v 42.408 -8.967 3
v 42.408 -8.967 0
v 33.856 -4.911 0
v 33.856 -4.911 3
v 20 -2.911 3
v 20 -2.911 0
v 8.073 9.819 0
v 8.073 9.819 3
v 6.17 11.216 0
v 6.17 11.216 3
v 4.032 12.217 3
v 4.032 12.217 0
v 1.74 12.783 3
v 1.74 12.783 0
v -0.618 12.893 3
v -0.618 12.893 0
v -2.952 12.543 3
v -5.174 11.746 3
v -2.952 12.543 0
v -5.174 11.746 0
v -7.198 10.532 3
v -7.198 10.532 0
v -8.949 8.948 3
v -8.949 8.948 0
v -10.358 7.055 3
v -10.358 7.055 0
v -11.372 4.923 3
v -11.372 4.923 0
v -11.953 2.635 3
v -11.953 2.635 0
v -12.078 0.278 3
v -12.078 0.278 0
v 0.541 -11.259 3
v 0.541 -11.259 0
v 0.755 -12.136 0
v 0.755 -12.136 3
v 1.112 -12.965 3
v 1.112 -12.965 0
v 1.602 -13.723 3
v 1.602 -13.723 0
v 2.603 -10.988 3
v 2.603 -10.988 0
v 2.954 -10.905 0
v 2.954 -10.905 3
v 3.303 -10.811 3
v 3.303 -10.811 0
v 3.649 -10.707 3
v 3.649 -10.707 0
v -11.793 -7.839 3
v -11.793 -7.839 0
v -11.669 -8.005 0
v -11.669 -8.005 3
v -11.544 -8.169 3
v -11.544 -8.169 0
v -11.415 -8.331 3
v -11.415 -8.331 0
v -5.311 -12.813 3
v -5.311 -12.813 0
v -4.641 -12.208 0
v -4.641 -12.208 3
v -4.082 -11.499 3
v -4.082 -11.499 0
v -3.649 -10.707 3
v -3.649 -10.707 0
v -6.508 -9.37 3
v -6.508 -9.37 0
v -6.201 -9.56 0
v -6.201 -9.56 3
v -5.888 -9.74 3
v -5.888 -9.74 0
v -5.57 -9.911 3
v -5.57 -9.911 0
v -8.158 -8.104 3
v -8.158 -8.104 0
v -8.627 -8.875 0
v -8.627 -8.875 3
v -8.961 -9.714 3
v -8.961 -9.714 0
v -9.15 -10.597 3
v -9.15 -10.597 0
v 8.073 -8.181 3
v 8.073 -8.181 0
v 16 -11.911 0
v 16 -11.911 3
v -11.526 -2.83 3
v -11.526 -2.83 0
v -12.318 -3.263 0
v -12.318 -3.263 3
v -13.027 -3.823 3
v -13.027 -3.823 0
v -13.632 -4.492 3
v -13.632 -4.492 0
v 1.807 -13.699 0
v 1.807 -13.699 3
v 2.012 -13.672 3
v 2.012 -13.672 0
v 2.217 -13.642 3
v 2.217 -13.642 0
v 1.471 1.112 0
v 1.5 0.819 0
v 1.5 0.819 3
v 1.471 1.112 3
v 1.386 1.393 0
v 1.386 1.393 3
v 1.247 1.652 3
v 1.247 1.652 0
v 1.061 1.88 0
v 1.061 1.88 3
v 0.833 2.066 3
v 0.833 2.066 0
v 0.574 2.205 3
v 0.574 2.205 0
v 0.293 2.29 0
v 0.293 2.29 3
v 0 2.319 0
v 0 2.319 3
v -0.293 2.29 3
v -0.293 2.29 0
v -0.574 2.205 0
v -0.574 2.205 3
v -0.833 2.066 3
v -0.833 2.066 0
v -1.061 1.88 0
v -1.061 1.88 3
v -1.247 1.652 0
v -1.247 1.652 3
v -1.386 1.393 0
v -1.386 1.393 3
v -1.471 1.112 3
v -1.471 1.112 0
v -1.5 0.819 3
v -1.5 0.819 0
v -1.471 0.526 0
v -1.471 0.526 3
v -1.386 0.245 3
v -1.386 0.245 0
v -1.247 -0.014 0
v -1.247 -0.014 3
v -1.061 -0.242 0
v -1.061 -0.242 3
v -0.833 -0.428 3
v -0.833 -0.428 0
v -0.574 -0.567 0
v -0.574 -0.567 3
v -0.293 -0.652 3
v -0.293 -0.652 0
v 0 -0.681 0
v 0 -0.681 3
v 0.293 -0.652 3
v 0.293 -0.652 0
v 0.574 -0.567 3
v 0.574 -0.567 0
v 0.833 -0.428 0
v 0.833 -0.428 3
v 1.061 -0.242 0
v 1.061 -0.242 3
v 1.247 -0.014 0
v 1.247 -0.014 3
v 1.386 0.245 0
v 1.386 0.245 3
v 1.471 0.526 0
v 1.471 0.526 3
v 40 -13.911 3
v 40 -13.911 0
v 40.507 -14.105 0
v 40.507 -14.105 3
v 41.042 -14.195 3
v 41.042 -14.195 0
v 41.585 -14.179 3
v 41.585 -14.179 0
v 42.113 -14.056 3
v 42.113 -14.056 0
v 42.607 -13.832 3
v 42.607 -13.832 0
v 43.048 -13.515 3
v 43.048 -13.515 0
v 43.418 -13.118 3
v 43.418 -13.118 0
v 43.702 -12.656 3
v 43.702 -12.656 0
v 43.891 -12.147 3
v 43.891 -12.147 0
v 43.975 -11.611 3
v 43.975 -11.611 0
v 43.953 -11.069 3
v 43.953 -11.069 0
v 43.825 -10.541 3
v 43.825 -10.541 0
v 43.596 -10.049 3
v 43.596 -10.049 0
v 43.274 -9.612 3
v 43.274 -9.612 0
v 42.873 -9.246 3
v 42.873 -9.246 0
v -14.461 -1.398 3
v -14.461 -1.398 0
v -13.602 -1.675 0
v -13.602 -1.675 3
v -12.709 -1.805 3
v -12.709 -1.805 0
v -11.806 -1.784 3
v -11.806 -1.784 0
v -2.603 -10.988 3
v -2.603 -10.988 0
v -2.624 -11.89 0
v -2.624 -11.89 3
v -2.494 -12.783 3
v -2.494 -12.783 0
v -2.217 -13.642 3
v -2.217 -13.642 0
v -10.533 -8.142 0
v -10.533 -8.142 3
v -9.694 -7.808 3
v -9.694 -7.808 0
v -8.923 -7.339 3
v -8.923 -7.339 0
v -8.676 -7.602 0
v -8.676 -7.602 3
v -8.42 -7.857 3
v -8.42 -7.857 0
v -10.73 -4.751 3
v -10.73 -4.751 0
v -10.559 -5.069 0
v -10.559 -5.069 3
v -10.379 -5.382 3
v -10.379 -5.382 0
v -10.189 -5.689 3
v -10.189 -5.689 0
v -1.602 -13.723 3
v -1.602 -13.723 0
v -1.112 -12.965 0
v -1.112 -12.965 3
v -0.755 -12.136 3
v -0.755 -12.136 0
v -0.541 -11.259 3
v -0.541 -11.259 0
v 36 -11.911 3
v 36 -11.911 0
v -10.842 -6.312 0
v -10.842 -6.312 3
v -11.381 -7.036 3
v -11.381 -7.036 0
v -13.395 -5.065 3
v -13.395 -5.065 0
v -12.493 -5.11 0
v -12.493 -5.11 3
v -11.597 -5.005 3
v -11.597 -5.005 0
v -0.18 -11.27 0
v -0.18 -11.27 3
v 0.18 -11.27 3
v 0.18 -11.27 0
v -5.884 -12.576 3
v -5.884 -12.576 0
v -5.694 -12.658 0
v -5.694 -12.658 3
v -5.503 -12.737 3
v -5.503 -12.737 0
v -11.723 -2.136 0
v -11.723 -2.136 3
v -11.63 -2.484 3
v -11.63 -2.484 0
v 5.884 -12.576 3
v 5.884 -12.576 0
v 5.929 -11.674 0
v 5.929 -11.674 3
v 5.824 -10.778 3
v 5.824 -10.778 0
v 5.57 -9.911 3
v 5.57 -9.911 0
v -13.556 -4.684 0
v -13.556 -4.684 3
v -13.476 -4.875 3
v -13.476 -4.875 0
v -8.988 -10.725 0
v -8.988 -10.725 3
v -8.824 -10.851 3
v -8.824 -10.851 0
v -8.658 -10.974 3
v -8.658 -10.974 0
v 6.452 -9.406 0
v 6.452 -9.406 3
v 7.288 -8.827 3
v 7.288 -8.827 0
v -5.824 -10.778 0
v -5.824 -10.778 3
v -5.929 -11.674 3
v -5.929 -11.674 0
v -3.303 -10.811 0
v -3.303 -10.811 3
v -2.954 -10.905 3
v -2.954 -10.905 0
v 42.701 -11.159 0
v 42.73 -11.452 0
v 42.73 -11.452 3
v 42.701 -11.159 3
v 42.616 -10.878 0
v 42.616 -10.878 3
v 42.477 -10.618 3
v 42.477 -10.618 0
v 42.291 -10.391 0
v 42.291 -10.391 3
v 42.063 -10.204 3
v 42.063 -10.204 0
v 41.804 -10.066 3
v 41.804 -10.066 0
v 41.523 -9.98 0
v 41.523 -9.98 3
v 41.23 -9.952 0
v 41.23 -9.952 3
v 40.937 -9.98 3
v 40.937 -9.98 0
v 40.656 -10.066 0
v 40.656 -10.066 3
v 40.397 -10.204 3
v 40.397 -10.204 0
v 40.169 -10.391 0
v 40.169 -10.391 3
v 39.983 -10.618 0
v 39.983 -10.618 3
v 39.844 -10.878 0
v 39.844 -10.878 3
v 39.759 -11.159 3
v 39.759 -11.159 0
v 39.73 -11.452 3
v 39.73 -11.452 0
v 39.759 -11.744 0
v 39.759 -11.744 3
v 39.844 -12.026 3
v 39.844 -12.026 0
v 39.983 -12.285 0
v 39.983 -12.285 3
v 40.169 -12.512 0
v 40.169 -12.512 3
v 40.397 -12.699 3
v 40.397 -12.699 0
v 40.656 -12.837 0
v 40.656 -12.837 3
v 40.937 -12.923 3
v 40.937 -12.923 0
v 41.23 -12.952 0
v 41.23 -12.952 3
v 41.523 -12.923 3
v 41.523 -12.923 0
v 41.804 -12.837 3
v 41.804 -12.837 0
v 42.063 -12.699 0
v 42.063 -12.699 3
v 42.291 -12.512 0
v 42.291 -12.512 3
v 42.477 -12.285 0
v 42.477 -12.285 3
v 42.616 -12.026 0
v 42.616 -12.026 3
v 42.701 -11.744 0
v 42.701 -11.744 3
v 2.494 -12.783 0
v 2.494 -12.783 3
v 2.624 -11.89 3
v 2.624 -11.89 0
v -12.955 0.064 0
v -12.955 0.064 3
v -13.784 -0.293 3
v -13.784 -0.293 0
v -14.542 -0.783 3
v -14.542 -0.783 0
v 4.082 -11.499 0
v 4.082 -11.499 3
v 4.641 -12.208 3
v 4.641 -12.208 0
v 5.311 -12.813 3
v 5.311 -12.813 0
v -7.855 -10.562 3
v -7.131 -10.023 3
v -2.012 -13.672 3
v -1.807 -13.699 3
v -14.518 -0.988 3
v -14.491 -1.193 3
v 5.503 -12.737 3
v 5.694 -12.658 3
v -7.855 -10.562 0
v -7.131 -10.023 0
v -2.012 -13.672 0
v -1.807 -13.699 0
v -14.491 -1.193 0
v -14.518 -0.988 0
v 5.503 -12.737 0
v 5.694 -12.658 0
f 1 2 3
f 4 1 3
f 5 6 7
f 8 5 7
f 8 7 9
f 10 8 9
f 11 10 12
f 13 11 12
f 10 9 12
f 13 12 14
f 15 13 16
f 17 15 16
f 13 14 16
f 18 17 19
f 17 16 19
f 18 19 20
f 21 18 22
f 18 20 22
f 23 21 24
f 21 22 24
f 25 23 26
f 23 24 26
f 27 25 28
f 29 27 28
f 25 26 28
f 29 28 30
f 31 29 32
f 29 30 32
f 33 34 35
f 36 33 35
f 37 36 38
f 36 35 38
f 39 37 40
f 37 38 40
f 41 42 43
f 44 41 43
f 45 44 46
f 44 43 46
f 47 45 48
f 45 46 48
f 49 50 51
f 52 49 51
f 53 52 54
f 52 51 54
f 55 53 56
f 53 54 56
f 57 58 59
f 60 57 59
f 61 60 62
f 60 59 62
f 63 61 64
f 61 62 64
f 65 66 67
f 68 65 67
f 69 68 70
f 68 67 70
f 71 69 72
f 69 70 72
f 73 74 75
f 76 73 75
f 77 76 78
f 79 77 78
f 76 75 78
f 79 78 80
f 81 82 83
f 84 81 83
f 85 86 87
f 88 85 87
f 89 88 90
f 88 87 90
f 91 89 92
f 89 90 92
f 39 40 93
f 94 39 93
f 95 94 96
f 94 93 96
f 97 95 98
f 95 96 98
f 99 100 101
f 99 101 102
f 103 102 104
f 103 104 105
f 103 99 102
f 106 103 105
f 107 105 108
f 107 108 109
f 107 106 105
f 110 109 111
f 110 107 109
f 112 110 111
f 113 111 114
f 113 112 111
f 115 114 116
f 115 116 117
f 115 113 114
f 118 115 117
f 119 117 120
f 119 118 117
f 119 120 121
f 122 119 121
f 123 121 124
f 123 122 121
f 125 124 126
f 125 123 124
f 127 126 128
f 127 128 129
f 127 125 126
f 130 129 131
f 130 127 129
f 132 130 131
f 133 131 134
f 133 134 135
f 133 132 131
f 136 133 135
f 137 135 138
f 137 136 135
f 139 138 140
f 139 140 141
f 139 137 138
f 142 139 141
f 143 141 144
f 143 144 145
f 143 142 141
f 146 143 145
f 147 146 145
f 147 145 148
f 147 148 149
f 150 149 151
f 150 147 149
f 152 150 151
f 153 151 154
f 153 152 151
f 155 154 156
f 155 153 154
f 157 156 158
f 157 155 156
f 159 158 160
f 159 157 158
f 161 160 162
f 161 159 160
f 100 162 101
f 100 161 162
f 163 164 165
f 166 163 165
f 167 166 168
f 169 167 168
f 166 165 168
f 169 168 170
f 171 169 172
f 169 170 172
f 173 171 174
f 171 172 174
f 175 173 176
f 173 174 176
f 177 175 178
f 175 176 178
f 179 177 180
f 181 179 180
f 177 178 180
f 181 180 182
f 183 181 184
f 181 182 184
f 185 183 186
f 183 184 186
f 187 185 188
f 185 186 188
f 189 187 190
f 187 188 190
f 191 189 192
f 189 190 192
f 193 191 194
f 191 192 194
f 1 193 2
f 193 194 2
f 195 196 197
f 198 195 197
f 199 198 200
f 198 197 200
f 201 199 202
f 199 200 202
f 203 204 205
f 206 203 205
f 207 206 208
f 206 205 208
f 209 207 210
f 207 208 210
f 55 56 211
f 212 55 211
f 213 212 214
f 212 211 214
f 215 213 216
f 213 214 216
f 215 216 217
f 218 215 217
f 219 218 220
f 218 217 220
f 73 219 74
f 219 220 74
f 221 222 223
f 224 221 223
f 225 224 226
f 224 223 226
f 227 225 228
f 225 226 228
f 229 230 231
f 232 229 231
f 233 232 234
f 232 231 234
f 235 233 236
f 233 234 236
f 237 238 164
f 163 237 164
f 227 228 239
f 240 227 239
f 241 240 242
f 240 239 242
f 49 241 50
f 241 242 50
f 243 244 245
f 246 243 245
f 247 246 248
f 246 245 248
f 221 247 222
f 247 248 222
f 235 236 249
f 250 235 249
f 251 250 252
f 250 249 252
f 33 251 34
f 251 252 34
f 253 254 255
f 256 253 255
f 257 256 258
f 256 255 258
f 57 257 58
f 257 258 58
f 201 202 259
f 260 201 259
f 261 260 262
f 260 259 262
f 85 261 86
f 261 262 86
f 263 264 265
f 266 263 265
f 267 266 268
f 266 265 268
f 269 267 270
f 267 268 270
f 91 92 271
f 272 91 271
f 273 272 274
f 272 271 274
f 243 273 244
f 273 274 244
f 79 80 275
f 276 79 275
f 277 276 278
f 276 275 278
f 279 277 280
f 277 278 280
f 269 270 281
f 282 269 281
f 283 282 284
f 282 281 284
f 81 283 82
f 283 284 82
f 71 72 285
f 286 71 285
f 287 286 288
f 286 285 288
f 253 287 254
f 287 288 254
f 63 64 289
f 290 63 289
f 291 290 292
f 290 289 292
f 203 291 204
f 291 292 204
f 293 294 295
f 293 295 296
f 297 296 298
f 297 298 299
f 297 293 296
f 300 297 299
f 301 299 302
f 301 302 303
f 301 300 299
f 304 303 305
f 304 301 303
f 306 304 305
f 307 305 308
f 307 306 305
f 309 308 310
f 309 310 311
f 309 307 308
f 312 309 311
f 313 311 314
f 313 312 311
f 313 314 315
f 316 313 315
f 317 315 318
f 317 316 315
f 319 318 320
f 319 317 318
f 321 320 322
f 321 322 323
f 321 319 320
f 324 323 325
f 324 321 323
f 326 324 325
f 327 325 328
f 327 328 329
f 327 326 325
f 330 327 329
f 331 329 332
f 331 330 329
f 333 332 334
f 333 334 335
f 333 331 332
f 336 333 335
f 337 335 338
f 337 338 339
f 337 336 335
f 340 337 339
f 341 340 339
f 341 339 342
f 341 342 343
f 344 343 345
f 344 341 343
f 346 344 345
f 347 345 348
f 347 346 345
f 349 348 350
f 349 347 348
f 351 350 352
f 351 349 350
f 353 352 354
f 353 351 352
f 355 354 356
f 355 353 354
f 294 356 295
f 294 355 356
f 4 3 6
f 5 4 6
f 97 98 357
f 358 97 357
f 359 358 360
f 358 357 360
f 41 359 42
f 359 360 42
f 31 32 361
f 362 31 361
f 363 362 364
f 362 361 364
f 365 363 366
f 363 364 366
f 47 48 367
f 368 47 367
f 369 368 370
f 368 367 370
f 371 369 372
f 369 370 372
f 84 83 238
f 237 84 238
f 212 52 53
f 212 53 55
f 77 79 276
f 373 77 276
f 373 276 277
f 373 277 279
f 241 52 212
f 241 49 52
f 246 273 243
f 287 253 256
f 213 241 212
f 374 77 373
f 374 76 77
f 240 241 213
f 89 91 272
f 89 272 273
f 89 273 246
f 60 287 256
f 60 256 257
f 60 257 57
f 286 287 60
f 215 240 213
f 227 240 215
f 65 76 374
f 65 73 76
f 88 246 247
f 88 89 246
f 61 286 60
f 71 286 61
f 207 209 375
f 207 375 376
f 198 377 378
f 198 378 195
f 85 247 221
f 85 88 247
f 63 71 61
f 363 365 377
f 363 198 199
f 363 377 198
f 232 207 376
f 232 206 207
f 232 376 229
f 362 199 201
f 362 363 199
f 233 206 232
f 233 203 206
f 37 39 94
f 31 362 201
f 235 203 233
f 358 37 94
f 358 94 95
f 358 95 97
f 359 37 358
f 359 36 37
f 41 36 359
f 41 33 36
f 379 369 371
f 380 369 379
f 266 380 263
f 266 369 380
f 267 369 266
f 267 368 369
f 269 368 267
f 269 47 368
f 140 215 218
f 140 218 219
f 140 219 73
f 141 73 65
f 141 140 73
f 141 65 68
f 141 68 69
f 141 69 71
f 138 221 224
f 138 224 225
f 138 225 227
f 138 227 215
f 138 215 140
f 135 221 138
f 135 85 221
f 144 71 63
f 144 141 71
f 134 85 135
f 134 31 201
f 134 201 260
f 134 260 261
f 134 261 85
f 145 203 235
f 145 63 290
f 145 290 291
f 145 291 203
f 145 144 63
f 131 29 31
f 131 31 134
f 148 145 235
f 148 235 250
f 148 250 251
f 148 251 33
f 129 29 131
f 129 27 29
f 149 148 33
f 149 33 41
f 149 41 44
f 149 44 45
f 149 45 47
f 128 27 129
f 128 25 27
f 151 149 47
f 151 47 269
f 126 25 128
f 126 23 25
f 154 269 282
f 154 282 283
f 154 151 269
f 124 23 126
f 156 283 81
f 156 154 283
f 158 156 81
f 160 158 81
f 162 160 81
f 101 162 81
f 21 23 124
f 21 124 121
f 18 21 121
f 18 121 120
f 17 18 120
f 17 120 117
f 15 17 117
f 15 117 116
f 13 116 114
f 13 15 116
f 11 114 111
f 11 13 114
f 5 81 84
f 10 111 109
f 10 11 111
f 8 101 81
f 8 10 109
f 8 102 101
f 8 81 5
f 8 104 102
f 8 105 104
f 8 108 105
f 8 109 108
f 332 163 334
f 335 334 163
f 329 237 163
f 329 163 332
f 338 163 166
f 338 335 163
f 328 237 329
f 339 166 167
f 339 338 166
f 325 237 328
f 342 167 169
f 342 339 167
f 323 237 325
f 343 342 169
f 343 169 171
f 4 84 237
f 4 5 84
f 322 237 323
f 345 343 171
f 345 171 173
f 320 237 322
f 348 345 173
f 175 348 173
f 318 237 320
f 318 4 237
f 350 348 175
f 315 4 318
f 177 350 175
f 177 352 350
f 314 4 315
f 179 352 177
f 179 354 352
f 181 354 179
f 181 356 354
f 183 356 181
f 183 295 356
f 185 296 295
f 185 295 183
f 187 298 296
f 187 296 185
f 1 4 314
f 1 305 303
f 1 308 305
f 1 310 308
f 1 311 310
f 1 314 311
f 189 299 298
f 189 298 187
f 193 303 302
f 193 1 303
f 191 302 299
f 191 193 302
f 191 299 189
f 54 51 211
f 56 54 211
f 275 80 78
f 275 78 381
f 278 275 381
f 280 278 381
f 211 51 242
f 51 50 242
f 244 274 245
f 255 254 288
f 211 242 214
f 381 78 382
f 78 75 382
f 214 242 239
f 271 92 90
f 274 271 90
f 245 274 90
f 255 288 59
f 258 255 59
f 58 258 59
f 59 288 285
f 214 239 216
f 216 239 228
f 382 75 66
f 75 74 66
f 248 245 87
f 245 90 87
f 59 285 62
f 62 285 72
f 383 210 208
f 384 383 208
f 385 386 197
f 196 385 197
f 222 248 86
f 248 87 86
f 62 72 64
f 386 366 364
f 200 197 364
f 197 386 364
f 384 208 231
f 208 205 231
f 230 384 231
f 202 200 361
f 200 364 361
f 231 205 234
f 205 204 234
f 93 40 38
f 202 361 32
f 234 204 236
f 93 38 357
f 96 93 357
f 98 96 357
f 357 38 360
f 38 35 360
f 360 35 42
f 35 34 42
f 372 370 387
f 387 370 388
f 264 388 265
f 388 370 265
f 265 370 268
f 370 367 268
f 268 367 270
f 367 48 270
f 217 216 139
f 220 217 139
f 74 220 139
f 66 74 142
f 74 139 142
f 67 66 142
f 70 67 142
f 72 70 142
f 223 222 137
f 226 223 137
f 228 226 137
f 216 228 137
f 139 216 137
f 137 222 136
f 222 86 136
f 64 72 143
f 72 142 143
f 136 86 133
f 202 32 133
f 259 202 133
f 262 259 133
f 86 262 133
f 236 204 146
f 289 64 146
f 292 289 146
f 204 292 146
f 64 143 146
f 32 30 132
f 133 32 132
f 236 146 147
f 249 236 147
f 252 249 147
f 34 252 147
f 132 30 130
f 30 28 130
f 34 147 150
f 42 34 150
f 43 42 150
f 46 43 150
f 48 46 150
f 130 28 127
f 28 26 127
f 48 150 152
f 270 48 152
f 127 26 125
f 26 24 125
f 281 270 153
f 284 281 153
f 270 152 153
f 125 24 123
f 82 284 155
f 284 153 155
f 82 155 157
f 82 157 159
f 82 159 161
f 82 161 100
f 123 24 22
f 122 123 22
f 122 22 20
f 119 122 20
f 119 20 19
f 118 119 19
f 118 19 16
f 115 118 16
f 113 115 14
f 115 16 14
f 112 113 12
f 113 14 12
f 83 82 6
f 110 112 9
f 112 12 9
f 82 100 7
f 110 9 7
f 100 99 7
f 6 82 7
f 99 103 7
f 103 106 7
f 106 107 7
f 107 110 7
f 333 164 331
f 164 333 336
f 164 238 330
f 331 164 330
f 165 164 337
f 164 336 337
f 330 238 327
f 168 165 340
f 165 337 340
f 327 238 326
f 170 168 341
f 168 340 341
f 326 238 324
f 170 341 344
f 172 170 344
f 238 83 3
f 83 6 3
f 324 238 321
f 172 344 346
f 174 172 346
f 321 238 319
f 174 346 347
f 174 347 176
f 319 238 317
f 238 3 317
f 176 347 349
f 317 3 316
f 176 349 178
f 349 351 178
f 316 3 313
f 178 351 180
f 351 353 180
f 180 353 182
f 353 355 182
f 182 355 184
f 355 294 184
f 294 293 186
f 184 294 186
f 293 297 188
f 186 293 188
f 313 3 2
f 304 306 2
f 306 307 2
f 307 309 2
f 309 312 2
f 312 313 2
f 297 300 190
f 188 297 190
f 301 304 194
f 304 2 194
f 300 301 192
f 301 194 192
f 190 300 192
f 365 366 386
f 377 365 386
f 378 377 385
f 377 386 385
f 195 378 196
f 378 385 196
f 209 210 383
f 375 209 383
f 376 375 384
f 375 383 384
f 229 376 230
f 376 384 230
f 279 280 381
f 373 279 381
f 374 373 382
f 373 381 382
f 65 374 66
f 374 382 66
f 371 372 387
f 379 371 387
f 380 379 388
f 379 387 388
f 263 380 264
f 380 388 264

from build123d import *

# Parameters (mm, degrees)
SKETCH2_R           = 1.5
BOSS_EXTRUDE2_DEPTH = 3


with BuildPart() as part:
    # Sketch2 → Boss-Extrude2 (new body)
    with BuildSketch(Plane.XY):
        with BuildLine():
            Line((33.856406461, -4.911436862), (20, -2.911436862))
            Line((20, -2.911436862), (8.072676136, 9.818872958))
            ThreePointArc((8.072676136, 9.818872958), (-5.173839679, 11.745880003), (-12.077884766, 0.277763382))
            ThreePointArc((-12.077884766, 0.277763382), (-13.37688471, -0.097129684), (-14.542044827, -0.782948586))
            ThreePointArc((-14.542044827, -0.782948586), (-14.504838322, -1.090725234), (-14.461118588, -1.3976444))
            ThreePointArc((-14.461118588, -1.3976444), (-13.158157346, -1.758528961), (-11.806390286, -1.78444193))
            ThreePointArc((-11.806390286, -1.78444193), (-11.67804324, -2.310249297), (-11.526291359, -2.829785359))
            ThreePointArc((-11.526291359, -2.829785359), (-12.683999488, -3.528110178), (-13.631954743, -4.492125996))
            ThreePointArc((-13.631954743, -4.492125996), (-13.516357561, -4.779785658), (-13.394691015, -5.064931306))
            ThreePointArc((-13.394691015, -5.064931306), (-12.042723303, -5.076287839), (-10.73030982, -4.751454786))
            ThreePointArc((-10.73030982, -4.751454786), (-10.470247132, -5.226127042), (-10.189200244, -5.688684064))
            ThreePointArc((-10.189200244, -5.688684064), (-11.126720661, -6.662850955), (-11.792869471, -7.839367605))
            ThreePointArc((-11.792869471, -7.839367605), (-11.606759368, -8.087306749), (-11.415437385, -8.331246676))
            ThreePointArc((-11.415437385, -8.331246676), (-10.106597569, -7.992301252), (-8.922976471, -7.338859012))
            ThreePointArc((-8.922976471, -7.338859012), (-8.548920985, -7.730048027), (-8.15773197, -8.104103513))
            ThreePointArc((-8.15773197, -8.104103513), (-8.81117421, -9.287724611), (-9.150119633, -10.596564427))
            ThreePointArc((-9.150119633, -10.596564427), (-8.906179706, -10.787886411), (-8.658240563, -10.973996513))
            ThreePointArc((-8.658240563, -10.973996513), (-7.481723913, -10.307847704), (-6.507557022, -9.370327286))
            ThreePointArc((-6.507557022, -9.370327286), (-6.045, -9.651374174), (-5.570327744, -9.911436862))
            ThreePointArc((-5.570327744, -9.911436862), (-5.895160797, -11.223850345), (-5.883804264, -12.575818057))
            ThreePointArc((-5.883804264, -12.575818057), (-5.598658616, -12.697484603), (-5.310998954, -12.813081785))
            ThreePointArc((-5.310998954, -12.813081785), (-4.346983136, -11.86512653), (-3.648658316, -10.707418401))
            ThreePointArc((-3.648658316, -10.707418401), (-3.129122255, -10.859170282), (-2.603314888, -10.987517329))
            ThreePointArc((-2.603314888, -10.987517329), (-2.577401919, -12.339284388), (-2.216517358, -13.64224563))
            ThreePointArc((-2.216517358, -13.64224563), (-1.909598192, -13.685965364), (-1.601821544, -13.723171869))
            ThreePointArc((-1.601821544, -13.723171869), (-0.916002642, -12.558011752), (-0.541109576, -11.259011808))
            ThreePointArc((-0.541109576, -11.259011808), (0, -11.271127042), (0.541109576, -11.259011808))
            ThreePointArc((0.541109576, -11.259011808), (0.916002642, -12.558011752), (1.601821544, -13.723171869))
            ThreePointArc((1.601821544, -13.723171869), (1.909598192, -13.685965364), (2.216517358, -13.64224563))
            ThreePointArc((2.216517358, -13.64224563), (2.577401919, -12.339284388), (2.603314888, -10.987517329))
            ThreePointArc((2.603314888, -10.987517329), (3.129122255, -10.859170282), (3.648658316, -10.707418401))
            ThreePointArc((3.648658316, -10.707418401), (4.346983136, -11.86512653), (5.310998954, -12.813081785))
            ThreePointArc((5.310998954, -12.813081785), (5.598658616, -12.697484603), (5.883804264, -12.575818057))
            ThreePointArc((5.883804264, -12.575818057), (5.895160797, -11.223850345), (5.570327744, -9.911436862))
            ThreePointArc((5.570327744, -9.911436862), (6.876145849, -9.125307162), (8.072676136, -8.181127042))
            Line((8.072676136, -8.181127042), (16, -11.911436862))
            Line((16, -11.911436862), (36, -11.911436862))
            Line((36, -11.911436862), (40, -13.911436862))
            ThreePointArc((40, -13.911436862), (43.70240259, -12.65581862), (42.40824957, -8.966708962))
            Line((42.40824957, -8.966708962), (33.856406461, -4.911436862))
        make_face()
        with Locations((41.229904242, -11.451628378)):
            Circle(SKETCH2_R, mode=Mode.SUBTRACT)
        with Locations((0, 0.818872958)):
            Circle(SKETCH2_R, mode=Mode.SUBTRACT)
    extrude(amount=BOSS_EXTRUDE2_DEPTH)


solid = part.part
